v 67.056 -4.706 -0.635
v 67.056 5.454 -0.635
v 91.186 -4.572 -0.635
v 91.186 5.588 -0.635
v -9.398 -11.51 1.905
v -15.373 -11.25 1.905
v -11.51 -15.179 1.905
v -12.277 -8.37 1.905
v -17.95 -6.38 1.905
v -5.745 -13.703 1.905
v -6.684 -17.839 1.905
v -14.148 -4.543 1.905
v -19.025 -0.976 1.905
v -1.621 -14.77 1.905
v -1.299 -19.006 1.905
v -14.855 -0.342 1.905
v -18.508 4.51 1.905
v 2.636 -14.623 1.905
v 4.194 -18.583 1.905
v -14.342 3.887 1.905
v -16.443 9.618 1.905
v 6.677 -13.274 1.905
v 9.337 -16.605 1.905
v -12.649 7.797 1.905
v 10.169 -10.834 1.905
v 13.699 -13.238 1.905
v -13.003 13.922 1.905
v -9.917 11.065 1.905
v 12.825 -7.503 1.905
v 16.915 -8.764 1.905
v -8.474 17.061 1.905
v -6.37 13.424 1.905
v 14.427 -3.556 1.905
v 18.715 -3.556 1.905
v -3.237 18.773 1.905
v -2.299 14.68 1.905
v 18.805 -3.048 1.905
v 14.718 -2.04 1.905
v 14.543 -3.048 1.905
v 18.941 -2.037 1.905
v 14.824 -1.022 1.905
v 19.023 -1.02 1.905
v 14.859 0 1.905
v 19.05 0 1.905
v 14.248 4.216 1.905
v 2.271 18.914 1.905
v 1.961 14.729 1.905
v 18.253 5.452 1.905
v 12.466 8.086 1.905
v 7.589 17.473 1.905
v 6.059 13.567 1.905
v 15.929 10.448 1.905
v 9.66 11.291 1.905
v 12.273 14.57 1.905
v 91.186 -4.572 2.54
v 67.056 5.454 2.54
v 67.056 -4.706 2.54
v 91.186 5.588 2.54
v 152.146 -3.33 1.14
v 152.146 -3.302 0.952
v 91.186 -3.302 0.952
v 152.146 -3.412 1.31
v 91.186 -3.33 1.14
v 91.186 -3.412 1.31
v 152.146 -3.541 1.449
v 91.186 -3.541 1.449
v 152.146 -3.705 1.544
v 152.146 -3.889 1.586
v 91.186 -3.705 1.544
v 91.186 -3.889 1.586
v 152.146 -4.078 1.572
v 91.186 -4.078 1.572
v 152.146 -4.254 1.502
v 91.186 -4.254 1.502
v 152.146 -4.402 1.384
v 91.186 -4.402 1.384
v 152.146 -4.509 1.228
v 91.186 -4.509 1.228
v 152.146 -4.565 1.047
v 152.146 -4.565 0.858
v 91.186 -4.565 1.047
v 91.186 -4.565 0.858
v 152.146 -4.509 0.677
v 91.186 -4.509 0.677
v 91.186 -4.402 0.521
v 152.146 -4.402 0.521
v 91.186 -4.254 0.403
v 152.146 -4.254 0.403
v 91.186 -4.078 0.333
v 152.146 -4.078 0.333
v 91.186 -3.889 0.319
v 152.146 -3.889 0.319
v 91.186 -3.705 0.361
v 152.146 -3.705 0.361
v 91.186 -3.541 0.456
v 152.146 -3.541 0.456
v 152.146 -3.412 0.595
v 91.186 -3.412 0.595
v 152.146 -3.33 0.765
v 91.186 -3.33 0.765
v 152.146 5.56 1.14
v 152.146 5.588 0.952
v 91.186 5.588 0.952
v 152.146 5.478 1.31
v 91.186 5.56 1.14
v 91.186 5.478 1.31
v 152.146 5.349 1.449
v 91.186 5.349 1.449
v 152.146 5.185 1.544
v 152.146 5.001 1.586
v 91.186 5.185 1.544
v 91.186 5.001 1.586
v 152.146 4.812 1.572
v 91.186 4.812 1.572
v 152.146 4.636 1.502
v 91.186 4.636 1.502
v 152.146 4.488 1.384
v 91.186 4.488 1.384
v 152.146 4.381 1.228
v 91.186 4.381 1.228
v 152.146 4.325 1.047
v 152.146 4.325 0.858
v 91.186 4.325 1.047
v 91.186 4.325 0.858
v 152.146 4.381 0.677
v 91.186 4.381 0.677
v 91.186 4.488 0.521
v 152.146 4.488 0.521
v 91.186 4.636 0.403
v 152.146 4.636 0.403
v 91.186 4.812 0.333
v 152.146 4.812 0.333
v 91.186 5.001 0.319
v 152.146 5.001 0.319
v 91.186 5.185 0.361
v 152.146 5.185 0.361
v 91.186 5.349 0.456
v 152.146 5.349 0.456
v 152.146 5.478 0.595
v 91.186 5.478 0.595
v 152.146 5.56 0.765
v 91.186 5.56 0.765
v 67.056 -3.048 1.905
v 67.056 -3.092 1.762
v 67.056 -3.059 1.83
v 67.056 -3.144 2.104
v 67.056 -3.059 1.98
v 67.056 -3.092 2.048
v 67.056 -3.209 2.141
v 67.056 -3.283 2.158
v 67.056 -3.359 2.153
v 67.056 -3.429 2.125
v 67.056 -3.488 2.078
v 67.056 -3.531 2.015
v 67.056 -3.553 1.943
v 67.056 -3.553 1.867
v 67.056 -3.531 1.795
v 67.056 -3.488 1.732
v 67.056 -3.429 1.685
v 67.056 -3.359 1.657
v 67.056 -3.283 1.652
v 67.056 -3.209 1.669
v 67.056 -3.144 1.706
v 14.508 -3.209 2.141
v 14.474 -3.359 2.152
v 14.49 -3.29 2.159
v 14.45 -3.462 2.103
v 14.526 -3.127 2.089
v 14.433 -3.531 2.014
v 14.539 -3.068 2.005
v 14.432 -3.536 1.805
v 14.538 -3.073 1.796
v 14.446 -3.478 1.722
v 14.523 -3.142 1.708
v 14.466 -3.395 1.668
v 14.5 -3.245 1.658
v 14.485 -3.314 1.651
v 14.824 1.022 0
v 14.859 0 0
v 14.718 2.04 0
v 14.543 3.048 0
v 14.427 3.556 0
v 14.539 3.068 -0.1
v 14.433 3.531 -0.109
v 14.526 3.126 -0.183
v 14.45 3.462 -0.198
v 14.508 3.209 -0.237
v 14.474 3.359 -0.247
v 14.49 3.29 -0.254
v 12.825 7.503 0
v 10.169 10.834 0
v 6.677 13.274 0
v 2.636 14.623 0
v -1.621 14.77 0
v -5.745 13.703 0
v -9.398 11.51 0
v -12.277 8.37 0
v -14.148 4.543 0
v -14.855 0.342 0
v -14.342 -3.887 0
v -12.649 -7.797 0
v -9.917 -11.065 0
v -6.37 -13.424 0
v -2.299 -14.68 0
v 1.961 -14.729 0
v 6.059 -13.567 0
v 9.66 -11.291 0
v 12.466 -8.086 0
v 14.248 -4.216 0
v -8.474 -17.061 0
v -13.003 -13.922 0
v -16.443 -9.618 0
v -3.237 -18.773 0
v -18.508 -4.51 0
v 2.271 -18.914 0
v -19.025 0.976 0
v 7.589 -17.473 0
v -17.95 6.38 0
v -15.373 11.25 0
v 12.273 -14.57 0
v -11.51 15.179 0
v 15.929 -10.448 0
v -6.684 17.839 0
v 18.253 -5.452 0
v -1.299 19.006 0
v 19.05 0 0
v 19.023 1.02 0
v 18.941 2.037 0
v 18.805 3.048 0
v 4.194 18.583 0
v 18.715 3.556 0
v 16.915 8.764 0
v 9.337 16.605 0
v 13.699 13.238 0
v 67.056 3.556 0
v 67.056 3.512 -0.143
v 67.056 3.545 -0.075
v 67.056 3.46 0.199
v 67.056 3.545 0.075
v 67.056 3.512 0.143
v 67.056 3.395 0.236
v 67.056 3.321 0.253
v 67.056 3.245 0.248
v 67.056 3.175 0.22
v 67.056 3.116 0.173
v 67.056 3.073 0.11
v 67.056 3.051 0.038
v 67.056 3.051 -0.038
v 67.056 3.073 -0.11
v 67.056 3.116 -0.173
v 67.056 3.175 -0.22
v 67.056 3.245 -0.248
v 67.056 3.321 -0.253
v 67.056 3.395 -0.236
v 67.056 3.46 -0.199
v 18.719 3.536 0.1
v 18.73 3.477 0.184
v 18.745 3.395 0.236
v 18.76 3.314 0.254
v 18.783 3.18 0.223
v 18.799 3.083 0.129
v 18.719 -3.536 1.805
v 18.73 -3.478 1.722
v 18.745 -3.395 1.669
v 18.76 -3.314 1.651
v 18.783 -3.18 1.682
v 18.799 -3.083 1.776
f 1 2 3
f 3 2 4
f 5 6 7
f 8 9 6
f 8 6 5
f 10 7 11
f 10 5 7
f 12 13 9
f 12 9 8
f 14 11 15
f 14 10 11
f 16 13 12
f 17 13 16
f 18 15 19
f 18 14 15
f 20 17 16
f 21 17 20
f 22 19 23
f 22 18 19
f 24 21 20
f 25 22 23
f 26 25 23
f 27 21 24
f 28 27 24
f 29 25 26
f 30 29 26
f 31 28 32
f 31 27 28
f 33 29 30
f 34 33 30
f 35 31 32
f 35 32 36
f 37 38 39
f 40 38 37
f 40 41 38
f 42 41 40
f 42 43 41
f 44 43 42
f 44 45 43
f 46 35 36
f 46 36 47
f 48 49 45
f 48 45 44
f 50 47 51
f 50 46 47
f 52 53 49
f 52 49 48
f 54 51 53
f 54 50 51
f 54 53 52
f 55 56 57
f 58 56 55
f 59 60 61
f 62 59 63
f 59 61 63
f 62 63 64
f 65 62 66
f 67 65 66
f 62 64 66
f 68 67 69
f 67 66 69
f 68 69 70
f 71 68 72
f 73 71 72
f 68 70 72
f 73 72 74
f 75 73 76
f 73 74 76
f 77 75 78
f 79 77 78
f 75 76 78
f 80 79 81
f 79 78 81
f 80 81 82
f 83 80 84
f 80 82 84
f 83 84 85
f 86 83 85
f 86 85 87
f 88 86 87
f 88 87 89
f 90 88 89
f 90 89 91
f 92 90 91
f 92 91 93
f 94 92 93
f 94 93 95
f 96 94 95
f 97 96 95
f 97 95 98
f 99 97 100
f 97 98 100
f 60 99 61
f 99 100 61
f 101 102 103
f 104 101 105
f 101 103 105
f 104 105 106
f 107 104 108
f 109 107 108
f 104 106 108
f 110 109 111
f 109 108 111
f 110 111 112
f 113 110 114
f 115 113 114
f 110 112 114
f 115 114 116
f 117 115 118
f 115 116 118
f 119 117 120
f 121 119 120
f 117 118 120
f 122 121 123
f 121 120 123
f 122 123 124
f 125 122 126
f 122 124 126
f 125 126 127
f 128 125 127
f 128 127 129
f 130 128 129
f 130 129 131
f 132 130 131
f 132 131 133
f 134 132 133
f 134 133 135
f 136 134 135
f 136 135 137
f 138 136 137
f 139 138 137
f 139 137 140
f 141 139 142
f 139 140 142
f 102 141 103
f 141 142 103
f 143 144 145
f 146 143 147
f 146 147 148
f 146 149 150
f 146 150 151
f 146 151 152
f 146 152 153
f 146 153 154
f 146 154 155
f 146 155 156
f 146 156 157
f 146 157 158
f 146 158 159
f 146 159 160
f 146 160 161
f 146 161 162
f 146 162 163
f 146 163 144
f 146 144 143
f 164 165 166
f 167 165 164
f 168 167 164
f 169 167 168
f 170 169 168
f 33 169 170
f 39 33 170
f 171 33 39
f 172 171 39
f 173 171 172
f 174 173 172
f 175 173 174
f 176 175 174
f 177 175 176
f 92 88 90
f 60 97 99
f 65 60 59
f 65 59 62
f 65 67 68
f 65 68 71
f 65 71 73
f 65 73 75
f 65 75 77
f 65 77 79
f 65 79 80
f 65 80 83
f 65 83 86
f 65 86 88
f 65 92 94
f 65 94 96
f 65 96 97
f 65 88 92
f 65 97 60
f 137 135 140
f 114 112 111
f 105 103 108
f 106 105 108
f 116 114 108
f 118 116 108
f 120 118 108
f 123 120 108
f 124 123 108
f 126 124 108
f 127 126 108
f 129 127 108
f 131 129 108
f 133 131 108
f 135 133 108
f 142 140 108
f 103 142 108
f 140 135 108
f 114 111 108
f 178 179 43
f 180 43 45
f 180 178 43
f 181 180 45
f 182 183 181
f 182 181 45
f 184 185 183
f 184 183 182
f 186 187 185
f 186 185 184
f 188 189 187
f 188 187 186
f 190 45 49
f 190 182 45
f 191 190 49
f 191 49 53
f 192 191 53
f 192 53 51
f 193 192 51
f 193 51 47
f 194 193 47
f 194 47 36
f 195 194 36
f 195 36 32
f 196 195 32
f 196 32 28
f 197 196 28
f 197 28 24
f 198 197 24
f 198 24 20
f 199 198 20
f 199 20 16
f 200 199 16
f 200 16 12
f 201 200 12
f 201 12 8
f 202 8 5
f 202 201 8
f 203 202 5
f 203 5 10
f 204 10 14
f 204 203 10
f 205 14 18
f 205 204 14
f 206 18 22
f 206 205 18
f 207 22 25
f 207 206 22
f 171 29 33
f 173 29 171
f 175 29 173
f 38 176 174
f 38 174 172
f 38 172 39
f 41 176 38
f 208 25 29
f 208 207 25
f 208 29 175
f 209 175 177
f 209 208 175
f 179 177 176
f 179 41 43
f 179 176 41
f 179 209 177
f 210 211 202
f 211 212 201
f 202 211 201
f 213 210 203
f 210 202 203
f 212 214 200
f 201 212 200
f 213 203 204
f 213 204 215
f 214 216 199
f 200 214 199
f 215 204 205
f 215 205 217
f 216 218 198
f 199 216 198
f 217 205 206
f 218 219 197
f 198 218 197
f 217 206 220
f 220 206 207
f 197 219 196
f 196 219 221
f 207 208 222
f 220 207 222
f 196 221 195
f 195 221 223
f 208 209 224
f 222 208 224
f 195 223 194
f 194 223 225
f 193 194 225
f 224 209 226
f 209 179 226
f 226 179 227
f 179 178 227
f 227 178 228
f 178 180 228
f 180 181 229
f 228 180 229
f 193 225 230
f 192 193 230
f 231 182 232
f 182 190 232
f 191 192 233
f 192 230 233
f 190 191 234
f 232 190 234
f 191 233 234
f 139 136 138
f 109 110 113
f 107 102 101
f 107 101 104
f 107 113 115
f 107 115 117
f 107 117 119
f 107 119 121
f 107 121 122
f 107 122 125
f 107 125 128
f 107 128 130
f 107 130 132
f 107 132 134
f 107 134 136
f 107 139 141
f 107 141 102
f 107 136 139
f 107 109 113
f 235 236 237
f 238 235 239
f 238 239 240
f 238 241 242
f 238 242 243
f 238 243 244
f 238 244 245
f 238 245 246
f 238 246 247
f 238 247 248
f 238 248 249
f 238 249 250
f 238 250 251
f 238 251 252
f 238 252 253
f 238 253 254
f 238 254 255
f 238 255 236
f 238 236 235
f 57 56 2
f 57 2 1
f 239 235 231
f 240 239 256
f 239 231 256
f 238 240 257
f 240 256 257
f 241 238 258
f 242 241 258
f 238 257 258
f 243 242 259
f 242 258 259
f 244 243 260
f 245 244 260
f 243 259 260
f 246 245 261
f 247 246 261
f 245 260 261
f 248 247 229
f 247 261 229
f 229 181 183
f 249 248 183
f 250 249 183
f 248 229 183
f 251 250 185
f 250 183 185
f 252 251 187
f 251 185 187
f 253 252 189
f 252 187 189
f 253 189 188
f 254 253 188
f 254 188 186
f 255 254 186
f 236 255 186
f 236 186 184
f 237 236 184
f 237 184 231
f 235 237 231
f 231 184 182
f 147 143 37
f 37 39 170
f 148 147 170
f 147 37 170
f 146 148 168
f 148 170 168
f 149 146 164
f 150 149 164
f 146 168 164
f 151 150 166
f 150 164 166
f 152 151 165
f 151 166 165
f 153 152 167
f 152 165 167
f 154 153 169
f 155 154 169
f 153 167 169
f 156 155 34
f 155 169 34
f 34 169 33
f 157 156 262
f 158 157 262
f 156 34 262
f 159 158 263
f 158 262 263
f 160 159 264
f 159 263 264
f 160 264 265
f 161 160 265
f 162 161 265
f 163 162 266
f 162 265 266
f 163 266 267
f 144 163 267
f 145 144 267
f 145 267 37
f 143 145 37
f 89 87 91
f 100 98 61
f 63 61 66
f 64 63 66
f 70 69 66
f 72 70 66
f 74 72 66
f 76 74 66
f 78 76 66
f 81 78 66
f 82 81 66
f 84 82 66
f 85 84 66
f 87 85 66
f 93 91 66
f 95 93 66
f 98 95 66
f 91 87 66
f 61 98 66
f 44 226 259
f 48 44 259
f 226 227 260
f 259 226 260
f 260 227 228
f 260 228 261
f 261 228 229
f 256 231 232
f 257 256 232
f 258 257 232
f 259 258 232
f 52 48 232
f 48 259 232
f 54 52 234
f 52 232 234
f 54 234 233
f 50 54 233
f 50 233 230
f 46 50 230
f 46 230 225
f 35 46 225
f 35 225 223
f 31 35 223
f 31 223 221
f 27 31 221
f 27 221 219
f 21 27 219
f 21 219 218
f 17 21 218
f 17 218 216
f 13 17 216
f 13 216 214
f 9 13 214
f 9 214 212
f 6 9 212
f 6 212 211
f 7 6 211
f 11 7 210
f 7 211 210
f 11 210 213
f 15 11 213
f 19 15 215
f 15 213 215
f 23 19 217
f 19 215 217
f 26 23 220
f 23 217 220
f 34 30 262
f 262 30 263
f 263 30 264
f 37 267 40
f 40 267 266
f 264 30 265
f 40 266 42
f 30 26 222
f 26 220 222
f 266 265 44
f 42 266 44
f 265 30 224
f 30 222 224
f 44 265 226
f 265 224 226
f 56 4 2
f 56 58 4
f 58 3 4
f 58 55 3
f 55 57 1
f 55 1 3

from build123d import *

# Parameters (mm, degrees)
F0_R          = 19.05
F0_R_2        = 14.859
F1_DEPTH      = 1.905
F2_R          = 0.254
F3_DEPTH      = 67.056
F4_DEPTH      = 67.056
F5_DEPTH      = 0.2550001
F5_DEPTH_BACK = 2.1600001
F7_DEPTH      = 2.54
F7_DEPTH_BACK = 0.635
F9_DEPTH      = 60.96
F10_R         = 0.635
F11_DEPTH     = 60.96


with BuildPart() as f1:
    # F0 (on Top) → F1 (new body)
    with BuildSketch(Plane.XY):
        Circle(F0_R)
        Circle(F0_R_2, mode=Mode.SUBTRACT)
    extrude(amount=F1_DEPTH)

    # F2 (on Right) → F3 (join)
    with BuildSketch(Plane.YZ):
        with Locations((-3.302, 1.905)):
            Circle(F2_R)
    extrude(amount=F3_DEPTH)

    # F2 (on Right) → F4 (join)
    with BuildSketch(Plane.YZ):
        with Locations((3.302, 0)):
            Circle(F2_R)
    extrude(amount=F4_DEPTH)

    # F0 (on Top) → F5 (cut, two sides)
    with BuildSketch(Plane.XY) as f5_sk:
        Circle(F0_R_2)
    extrude(amount=-F5_DEPTH, mode=Mode.SUBTRACT)
    extrude(f5_sk.sketch, amount=F5_DEPTH_BACK, mode=Mode.SUBTRACT)


with BuildPart() as f7:
    # F6 (on Top) → F7 (new body, two sides)
    with BuildSketch(Plane.XY) as f7_sk:
        Polygon((91.185625081, 5.588319203), (67.056, 5.4538073018), (67.056, -4.7061926982), (91.185625081, -4.571680797), align=None)
    extrude(amount=F7_DEPTH)
    extrude(f7_sk.sketch, amount=-F7_DEPTH_BACK)


with BuildPart() as f9:
    # F8 (on face) → F9 (new body)
    with BuildSketch(Plane.YZ.offset(91.185625081)):
        with BuildLine():
            ThreePointArc((-4.571680797, 0.9525), (-3.936680797, 0.3175), (-3.301680797, 0.9525))
            ThreePointArc((-3.301680797, 0.9525), (-3.936680797, 1.5875), (-4.571680797, 0.9525))
        make_face()
    extrude(amount=F9_DEPTH)


with BuildPart() as f11:
    # F10 (on face) → F11 (new body)
    with BuildSketch(Plane.YZ.offset(91.185625081)):
        with Locations((4.953319203, 0.9525)):
            Circle(F10_R)
    extrude(amount=F11_DEPTH)


solid = Compound([f1.part, f7.part, f9.part, f11.part])
